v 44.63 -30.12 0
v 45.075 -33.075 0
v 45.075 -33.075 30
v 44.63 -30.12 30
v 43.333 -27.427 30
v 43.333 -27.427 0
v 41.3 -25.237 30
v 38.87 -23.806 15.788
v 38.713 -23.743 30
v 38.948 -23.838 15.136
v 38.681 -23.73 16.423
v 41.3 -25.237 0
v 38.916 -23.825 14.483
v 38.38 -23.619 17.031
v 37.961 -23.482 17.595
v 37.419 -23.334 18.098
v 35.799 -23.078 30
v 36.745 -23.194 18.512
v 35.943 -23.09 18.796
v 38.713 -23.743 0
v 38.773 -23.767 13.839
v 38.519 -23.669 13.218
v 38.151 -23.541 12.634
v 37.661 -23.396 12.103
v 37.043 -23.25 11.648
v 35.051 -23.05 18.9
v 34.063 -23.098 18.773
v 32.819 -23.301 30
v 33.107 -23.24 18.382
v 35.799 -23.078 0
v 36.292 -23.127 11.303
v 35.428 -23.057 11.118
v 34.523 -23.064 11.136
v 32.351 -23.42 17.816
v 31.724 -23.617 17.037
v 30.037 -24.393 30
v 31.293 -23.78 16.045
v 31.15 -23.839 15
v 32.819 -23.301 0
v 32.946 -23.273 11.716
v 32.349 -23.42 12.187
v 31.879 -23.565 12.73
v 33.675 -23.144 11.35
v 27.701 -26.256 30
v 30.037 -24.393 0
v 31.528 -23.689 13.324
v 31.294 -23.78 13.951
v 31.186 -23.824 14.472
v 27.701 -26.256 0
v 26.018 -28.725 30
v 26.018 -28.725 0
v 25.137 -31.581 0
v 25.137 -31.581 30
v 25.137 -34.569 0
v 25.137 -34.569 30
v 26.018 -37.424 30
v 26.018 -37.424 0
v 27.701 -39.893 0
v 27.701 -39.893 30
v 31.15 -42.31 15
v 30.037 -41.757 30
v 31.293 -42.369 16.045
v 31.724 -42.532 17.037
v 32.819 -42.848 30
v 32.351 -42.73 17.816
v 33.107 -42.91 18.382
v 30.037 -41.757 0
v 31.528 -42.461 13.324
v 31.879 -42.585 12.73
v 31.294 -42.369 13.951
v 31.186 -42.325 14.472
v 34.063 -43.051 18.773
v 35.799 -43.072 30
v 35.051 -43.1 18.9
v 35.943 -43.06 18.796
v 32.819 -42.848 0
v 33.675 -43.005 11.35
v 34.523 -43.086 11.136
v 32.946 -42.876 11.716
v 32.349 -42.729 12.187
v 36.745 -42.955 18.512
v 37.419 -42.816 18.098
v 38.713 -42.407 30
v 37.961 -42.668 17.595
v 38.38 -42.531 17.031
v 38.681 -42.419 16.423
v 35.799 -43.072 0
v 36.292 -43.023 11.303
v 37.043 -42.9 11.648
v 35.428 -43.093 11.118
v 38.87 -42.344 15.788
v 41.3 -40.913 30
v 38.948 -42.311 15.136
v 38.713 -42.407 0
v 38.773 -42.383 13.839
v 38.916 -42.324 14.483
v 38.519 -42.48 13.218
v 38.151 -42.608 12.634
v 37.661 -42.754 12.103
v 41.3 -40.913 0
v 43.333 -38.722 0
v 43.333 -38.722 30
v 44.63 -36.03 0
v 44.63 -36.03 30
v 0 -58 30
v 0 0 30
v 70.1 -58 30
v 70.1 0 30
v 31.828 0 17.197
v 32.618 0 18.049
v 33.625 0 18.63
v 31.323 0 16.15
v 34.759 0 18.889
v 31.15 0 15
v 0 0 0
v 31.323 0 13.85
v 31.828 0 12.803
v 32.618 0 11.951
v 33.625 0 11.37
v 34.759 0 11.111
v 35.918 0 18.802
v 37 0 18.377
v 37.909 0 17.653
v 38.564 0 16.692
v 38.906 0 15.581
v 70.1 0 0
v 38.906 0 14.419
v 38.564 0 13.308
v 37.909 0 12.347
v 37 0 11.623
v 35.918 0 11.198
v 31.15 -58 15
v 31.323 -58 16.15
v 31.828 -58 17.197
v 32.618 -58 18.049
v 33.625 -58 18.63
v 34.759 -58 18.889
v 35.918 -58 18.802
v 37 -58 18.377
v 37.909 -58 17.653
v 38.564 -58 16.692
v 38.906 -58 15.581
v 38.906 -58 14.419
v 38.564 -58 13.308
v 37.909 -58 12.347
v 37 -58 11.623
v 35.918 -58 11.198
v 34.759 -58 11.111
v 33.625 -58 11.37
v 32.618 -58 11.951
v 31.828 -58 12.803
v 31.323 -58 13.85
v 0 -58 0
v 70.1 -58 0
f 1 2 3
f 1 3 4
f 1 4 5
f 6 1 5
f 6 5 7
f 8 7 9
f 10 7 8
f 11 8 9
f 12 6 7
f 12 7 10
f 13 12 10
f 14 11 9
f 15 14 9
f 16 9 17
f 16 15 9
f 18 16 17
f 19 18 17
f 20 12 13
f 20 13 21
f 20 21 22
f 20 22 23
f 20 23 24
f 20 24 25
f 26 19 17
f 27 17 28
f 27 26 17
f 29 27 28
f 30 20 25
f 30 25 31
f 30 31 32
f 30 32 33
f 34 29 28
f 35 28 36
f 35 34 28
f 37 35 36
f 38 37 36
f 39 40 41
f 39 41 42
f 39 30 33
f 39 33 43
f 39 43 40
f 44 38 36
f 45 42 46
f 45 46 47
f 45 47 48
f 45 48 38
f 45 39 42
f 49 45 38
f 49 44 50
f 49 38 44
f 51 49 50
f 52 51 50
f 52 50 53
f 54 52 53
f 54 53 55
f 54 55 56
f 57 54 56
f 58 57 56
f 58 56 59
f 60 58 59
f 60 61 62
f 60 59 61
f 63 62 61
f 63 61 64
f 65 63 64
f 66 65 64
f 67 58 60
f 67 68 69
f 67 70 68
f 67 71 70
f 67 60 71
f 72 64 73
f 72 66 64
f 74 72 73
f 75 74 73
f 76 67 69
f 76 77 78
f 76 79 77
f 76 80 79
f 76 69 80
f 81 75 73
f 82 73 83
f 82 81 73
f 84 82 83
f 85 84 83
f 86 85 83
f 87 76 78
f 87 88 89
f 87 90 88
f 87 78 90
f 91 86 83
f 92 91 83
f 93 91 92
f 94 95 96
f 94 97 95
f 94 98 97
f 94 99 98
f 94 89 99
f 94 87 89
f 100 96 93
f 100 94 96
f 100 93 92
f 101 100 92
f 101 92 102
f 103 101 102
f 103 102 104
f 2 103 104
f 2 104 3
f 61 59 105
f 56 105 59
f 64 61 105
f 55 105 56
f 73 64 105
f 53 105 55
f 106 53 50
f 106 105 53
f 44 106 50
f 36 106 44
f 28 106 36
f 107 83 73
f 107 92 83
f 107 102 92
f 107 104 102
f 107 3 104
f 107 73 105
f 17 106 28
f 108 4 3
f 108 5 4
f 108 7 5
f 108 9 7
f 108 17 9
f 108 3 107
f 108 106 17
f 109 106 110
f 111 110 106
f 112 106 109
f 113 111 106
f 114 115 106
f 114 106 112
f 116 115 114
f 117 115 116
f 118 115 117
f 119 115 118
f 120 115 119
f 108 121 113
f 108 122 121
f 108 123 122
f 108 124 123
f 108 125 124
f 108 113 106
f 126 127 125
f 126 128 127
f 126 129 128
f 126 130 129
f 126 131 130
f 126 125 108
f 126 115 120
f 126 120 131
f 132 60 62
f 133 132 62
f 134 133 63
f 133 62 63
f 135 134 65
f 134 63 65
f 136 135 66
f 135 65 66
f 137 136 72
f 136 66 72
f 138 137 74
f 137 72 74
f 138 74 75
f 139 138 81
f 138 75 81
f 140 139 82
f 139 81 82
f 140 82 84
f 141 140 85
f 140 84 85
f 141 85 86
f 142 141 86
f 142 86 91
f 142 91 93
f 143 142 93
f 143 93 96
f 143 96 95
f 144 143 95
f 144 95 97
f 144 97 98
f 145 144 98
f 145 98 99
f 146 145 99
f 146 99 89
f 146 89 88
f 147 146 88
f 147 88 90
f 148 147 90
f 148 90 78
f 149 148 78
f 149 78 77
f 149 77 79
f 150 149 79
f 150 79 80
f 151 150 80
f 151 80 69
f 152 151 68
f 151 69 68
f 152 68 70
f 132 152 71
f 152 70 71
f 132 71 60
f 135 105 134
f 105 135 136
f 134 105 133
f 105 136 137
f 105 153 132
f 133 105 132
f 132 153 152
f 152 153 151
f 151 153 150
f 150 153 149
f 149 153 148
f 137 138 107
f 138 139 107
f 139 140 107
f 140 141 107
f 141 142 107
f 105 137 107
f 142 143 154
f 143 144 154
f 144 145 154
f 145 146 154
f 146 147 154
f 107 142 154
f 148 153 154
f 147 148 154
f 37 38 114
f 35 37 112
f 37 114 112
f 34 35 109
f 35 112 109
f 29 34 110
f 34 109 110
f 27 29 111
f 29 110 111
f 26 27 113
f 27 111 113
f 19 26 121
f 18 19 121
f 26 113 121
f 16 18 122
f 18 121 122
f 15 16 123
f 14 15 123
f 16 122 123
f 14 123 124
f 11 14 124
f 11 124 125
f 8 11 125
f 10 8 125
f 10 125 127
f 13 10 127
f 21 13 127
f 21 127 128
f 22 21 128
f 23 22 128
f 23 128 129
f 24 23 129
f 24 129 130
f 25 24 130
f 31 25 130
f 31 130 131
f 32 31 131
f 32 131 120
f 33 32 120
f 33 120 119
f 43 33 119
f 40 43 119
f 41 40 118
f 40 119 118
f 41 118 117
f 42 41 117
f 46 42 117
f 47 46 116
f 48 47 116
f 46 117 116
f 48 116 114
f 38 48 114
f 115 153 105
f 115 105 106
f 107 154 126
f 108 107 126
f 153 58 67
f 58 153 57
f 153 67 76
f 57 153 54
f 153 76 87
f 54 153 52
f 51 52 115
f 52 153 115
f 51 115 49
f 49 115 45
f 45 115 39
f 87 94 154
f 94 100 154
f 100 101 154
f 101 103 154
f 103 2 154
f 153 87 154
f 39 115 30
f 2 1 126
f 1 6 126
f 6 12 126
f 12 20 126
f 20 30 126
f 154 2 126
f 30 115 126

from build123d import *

# Parameters (mm, degrees)
F0_W     = 70.1
F0_H     = 58
F1_DEPTH = 30
F2_R     = 10.025
F3_DEPTH = 30
F5_D     = 7.8


with BuildPart() as f1:
    # F0 (on Top) → F1 (new body)
    with BuildSketch(Plane.XY):
        with Locations((35.05, -29)):
            Rectangle(F0_W, F0_H)
    extrude(amount=F1_DEPTH)

    # F2 (on face) → F3 (cut)
    with BuildSketch(Plane.XY):
        with Locations((35.05, -33.0747030675)):
            Circle(F2_R)
    extrude(amount=F3_DEPTH, mode=Mode.SUBTRACT)

    # F5 (through all)
    with Locations(Plane.XZ.offset(58)):
        with Locations((35.05, 15)):
            Hole(F5_D / 2)


solid = f1.part
